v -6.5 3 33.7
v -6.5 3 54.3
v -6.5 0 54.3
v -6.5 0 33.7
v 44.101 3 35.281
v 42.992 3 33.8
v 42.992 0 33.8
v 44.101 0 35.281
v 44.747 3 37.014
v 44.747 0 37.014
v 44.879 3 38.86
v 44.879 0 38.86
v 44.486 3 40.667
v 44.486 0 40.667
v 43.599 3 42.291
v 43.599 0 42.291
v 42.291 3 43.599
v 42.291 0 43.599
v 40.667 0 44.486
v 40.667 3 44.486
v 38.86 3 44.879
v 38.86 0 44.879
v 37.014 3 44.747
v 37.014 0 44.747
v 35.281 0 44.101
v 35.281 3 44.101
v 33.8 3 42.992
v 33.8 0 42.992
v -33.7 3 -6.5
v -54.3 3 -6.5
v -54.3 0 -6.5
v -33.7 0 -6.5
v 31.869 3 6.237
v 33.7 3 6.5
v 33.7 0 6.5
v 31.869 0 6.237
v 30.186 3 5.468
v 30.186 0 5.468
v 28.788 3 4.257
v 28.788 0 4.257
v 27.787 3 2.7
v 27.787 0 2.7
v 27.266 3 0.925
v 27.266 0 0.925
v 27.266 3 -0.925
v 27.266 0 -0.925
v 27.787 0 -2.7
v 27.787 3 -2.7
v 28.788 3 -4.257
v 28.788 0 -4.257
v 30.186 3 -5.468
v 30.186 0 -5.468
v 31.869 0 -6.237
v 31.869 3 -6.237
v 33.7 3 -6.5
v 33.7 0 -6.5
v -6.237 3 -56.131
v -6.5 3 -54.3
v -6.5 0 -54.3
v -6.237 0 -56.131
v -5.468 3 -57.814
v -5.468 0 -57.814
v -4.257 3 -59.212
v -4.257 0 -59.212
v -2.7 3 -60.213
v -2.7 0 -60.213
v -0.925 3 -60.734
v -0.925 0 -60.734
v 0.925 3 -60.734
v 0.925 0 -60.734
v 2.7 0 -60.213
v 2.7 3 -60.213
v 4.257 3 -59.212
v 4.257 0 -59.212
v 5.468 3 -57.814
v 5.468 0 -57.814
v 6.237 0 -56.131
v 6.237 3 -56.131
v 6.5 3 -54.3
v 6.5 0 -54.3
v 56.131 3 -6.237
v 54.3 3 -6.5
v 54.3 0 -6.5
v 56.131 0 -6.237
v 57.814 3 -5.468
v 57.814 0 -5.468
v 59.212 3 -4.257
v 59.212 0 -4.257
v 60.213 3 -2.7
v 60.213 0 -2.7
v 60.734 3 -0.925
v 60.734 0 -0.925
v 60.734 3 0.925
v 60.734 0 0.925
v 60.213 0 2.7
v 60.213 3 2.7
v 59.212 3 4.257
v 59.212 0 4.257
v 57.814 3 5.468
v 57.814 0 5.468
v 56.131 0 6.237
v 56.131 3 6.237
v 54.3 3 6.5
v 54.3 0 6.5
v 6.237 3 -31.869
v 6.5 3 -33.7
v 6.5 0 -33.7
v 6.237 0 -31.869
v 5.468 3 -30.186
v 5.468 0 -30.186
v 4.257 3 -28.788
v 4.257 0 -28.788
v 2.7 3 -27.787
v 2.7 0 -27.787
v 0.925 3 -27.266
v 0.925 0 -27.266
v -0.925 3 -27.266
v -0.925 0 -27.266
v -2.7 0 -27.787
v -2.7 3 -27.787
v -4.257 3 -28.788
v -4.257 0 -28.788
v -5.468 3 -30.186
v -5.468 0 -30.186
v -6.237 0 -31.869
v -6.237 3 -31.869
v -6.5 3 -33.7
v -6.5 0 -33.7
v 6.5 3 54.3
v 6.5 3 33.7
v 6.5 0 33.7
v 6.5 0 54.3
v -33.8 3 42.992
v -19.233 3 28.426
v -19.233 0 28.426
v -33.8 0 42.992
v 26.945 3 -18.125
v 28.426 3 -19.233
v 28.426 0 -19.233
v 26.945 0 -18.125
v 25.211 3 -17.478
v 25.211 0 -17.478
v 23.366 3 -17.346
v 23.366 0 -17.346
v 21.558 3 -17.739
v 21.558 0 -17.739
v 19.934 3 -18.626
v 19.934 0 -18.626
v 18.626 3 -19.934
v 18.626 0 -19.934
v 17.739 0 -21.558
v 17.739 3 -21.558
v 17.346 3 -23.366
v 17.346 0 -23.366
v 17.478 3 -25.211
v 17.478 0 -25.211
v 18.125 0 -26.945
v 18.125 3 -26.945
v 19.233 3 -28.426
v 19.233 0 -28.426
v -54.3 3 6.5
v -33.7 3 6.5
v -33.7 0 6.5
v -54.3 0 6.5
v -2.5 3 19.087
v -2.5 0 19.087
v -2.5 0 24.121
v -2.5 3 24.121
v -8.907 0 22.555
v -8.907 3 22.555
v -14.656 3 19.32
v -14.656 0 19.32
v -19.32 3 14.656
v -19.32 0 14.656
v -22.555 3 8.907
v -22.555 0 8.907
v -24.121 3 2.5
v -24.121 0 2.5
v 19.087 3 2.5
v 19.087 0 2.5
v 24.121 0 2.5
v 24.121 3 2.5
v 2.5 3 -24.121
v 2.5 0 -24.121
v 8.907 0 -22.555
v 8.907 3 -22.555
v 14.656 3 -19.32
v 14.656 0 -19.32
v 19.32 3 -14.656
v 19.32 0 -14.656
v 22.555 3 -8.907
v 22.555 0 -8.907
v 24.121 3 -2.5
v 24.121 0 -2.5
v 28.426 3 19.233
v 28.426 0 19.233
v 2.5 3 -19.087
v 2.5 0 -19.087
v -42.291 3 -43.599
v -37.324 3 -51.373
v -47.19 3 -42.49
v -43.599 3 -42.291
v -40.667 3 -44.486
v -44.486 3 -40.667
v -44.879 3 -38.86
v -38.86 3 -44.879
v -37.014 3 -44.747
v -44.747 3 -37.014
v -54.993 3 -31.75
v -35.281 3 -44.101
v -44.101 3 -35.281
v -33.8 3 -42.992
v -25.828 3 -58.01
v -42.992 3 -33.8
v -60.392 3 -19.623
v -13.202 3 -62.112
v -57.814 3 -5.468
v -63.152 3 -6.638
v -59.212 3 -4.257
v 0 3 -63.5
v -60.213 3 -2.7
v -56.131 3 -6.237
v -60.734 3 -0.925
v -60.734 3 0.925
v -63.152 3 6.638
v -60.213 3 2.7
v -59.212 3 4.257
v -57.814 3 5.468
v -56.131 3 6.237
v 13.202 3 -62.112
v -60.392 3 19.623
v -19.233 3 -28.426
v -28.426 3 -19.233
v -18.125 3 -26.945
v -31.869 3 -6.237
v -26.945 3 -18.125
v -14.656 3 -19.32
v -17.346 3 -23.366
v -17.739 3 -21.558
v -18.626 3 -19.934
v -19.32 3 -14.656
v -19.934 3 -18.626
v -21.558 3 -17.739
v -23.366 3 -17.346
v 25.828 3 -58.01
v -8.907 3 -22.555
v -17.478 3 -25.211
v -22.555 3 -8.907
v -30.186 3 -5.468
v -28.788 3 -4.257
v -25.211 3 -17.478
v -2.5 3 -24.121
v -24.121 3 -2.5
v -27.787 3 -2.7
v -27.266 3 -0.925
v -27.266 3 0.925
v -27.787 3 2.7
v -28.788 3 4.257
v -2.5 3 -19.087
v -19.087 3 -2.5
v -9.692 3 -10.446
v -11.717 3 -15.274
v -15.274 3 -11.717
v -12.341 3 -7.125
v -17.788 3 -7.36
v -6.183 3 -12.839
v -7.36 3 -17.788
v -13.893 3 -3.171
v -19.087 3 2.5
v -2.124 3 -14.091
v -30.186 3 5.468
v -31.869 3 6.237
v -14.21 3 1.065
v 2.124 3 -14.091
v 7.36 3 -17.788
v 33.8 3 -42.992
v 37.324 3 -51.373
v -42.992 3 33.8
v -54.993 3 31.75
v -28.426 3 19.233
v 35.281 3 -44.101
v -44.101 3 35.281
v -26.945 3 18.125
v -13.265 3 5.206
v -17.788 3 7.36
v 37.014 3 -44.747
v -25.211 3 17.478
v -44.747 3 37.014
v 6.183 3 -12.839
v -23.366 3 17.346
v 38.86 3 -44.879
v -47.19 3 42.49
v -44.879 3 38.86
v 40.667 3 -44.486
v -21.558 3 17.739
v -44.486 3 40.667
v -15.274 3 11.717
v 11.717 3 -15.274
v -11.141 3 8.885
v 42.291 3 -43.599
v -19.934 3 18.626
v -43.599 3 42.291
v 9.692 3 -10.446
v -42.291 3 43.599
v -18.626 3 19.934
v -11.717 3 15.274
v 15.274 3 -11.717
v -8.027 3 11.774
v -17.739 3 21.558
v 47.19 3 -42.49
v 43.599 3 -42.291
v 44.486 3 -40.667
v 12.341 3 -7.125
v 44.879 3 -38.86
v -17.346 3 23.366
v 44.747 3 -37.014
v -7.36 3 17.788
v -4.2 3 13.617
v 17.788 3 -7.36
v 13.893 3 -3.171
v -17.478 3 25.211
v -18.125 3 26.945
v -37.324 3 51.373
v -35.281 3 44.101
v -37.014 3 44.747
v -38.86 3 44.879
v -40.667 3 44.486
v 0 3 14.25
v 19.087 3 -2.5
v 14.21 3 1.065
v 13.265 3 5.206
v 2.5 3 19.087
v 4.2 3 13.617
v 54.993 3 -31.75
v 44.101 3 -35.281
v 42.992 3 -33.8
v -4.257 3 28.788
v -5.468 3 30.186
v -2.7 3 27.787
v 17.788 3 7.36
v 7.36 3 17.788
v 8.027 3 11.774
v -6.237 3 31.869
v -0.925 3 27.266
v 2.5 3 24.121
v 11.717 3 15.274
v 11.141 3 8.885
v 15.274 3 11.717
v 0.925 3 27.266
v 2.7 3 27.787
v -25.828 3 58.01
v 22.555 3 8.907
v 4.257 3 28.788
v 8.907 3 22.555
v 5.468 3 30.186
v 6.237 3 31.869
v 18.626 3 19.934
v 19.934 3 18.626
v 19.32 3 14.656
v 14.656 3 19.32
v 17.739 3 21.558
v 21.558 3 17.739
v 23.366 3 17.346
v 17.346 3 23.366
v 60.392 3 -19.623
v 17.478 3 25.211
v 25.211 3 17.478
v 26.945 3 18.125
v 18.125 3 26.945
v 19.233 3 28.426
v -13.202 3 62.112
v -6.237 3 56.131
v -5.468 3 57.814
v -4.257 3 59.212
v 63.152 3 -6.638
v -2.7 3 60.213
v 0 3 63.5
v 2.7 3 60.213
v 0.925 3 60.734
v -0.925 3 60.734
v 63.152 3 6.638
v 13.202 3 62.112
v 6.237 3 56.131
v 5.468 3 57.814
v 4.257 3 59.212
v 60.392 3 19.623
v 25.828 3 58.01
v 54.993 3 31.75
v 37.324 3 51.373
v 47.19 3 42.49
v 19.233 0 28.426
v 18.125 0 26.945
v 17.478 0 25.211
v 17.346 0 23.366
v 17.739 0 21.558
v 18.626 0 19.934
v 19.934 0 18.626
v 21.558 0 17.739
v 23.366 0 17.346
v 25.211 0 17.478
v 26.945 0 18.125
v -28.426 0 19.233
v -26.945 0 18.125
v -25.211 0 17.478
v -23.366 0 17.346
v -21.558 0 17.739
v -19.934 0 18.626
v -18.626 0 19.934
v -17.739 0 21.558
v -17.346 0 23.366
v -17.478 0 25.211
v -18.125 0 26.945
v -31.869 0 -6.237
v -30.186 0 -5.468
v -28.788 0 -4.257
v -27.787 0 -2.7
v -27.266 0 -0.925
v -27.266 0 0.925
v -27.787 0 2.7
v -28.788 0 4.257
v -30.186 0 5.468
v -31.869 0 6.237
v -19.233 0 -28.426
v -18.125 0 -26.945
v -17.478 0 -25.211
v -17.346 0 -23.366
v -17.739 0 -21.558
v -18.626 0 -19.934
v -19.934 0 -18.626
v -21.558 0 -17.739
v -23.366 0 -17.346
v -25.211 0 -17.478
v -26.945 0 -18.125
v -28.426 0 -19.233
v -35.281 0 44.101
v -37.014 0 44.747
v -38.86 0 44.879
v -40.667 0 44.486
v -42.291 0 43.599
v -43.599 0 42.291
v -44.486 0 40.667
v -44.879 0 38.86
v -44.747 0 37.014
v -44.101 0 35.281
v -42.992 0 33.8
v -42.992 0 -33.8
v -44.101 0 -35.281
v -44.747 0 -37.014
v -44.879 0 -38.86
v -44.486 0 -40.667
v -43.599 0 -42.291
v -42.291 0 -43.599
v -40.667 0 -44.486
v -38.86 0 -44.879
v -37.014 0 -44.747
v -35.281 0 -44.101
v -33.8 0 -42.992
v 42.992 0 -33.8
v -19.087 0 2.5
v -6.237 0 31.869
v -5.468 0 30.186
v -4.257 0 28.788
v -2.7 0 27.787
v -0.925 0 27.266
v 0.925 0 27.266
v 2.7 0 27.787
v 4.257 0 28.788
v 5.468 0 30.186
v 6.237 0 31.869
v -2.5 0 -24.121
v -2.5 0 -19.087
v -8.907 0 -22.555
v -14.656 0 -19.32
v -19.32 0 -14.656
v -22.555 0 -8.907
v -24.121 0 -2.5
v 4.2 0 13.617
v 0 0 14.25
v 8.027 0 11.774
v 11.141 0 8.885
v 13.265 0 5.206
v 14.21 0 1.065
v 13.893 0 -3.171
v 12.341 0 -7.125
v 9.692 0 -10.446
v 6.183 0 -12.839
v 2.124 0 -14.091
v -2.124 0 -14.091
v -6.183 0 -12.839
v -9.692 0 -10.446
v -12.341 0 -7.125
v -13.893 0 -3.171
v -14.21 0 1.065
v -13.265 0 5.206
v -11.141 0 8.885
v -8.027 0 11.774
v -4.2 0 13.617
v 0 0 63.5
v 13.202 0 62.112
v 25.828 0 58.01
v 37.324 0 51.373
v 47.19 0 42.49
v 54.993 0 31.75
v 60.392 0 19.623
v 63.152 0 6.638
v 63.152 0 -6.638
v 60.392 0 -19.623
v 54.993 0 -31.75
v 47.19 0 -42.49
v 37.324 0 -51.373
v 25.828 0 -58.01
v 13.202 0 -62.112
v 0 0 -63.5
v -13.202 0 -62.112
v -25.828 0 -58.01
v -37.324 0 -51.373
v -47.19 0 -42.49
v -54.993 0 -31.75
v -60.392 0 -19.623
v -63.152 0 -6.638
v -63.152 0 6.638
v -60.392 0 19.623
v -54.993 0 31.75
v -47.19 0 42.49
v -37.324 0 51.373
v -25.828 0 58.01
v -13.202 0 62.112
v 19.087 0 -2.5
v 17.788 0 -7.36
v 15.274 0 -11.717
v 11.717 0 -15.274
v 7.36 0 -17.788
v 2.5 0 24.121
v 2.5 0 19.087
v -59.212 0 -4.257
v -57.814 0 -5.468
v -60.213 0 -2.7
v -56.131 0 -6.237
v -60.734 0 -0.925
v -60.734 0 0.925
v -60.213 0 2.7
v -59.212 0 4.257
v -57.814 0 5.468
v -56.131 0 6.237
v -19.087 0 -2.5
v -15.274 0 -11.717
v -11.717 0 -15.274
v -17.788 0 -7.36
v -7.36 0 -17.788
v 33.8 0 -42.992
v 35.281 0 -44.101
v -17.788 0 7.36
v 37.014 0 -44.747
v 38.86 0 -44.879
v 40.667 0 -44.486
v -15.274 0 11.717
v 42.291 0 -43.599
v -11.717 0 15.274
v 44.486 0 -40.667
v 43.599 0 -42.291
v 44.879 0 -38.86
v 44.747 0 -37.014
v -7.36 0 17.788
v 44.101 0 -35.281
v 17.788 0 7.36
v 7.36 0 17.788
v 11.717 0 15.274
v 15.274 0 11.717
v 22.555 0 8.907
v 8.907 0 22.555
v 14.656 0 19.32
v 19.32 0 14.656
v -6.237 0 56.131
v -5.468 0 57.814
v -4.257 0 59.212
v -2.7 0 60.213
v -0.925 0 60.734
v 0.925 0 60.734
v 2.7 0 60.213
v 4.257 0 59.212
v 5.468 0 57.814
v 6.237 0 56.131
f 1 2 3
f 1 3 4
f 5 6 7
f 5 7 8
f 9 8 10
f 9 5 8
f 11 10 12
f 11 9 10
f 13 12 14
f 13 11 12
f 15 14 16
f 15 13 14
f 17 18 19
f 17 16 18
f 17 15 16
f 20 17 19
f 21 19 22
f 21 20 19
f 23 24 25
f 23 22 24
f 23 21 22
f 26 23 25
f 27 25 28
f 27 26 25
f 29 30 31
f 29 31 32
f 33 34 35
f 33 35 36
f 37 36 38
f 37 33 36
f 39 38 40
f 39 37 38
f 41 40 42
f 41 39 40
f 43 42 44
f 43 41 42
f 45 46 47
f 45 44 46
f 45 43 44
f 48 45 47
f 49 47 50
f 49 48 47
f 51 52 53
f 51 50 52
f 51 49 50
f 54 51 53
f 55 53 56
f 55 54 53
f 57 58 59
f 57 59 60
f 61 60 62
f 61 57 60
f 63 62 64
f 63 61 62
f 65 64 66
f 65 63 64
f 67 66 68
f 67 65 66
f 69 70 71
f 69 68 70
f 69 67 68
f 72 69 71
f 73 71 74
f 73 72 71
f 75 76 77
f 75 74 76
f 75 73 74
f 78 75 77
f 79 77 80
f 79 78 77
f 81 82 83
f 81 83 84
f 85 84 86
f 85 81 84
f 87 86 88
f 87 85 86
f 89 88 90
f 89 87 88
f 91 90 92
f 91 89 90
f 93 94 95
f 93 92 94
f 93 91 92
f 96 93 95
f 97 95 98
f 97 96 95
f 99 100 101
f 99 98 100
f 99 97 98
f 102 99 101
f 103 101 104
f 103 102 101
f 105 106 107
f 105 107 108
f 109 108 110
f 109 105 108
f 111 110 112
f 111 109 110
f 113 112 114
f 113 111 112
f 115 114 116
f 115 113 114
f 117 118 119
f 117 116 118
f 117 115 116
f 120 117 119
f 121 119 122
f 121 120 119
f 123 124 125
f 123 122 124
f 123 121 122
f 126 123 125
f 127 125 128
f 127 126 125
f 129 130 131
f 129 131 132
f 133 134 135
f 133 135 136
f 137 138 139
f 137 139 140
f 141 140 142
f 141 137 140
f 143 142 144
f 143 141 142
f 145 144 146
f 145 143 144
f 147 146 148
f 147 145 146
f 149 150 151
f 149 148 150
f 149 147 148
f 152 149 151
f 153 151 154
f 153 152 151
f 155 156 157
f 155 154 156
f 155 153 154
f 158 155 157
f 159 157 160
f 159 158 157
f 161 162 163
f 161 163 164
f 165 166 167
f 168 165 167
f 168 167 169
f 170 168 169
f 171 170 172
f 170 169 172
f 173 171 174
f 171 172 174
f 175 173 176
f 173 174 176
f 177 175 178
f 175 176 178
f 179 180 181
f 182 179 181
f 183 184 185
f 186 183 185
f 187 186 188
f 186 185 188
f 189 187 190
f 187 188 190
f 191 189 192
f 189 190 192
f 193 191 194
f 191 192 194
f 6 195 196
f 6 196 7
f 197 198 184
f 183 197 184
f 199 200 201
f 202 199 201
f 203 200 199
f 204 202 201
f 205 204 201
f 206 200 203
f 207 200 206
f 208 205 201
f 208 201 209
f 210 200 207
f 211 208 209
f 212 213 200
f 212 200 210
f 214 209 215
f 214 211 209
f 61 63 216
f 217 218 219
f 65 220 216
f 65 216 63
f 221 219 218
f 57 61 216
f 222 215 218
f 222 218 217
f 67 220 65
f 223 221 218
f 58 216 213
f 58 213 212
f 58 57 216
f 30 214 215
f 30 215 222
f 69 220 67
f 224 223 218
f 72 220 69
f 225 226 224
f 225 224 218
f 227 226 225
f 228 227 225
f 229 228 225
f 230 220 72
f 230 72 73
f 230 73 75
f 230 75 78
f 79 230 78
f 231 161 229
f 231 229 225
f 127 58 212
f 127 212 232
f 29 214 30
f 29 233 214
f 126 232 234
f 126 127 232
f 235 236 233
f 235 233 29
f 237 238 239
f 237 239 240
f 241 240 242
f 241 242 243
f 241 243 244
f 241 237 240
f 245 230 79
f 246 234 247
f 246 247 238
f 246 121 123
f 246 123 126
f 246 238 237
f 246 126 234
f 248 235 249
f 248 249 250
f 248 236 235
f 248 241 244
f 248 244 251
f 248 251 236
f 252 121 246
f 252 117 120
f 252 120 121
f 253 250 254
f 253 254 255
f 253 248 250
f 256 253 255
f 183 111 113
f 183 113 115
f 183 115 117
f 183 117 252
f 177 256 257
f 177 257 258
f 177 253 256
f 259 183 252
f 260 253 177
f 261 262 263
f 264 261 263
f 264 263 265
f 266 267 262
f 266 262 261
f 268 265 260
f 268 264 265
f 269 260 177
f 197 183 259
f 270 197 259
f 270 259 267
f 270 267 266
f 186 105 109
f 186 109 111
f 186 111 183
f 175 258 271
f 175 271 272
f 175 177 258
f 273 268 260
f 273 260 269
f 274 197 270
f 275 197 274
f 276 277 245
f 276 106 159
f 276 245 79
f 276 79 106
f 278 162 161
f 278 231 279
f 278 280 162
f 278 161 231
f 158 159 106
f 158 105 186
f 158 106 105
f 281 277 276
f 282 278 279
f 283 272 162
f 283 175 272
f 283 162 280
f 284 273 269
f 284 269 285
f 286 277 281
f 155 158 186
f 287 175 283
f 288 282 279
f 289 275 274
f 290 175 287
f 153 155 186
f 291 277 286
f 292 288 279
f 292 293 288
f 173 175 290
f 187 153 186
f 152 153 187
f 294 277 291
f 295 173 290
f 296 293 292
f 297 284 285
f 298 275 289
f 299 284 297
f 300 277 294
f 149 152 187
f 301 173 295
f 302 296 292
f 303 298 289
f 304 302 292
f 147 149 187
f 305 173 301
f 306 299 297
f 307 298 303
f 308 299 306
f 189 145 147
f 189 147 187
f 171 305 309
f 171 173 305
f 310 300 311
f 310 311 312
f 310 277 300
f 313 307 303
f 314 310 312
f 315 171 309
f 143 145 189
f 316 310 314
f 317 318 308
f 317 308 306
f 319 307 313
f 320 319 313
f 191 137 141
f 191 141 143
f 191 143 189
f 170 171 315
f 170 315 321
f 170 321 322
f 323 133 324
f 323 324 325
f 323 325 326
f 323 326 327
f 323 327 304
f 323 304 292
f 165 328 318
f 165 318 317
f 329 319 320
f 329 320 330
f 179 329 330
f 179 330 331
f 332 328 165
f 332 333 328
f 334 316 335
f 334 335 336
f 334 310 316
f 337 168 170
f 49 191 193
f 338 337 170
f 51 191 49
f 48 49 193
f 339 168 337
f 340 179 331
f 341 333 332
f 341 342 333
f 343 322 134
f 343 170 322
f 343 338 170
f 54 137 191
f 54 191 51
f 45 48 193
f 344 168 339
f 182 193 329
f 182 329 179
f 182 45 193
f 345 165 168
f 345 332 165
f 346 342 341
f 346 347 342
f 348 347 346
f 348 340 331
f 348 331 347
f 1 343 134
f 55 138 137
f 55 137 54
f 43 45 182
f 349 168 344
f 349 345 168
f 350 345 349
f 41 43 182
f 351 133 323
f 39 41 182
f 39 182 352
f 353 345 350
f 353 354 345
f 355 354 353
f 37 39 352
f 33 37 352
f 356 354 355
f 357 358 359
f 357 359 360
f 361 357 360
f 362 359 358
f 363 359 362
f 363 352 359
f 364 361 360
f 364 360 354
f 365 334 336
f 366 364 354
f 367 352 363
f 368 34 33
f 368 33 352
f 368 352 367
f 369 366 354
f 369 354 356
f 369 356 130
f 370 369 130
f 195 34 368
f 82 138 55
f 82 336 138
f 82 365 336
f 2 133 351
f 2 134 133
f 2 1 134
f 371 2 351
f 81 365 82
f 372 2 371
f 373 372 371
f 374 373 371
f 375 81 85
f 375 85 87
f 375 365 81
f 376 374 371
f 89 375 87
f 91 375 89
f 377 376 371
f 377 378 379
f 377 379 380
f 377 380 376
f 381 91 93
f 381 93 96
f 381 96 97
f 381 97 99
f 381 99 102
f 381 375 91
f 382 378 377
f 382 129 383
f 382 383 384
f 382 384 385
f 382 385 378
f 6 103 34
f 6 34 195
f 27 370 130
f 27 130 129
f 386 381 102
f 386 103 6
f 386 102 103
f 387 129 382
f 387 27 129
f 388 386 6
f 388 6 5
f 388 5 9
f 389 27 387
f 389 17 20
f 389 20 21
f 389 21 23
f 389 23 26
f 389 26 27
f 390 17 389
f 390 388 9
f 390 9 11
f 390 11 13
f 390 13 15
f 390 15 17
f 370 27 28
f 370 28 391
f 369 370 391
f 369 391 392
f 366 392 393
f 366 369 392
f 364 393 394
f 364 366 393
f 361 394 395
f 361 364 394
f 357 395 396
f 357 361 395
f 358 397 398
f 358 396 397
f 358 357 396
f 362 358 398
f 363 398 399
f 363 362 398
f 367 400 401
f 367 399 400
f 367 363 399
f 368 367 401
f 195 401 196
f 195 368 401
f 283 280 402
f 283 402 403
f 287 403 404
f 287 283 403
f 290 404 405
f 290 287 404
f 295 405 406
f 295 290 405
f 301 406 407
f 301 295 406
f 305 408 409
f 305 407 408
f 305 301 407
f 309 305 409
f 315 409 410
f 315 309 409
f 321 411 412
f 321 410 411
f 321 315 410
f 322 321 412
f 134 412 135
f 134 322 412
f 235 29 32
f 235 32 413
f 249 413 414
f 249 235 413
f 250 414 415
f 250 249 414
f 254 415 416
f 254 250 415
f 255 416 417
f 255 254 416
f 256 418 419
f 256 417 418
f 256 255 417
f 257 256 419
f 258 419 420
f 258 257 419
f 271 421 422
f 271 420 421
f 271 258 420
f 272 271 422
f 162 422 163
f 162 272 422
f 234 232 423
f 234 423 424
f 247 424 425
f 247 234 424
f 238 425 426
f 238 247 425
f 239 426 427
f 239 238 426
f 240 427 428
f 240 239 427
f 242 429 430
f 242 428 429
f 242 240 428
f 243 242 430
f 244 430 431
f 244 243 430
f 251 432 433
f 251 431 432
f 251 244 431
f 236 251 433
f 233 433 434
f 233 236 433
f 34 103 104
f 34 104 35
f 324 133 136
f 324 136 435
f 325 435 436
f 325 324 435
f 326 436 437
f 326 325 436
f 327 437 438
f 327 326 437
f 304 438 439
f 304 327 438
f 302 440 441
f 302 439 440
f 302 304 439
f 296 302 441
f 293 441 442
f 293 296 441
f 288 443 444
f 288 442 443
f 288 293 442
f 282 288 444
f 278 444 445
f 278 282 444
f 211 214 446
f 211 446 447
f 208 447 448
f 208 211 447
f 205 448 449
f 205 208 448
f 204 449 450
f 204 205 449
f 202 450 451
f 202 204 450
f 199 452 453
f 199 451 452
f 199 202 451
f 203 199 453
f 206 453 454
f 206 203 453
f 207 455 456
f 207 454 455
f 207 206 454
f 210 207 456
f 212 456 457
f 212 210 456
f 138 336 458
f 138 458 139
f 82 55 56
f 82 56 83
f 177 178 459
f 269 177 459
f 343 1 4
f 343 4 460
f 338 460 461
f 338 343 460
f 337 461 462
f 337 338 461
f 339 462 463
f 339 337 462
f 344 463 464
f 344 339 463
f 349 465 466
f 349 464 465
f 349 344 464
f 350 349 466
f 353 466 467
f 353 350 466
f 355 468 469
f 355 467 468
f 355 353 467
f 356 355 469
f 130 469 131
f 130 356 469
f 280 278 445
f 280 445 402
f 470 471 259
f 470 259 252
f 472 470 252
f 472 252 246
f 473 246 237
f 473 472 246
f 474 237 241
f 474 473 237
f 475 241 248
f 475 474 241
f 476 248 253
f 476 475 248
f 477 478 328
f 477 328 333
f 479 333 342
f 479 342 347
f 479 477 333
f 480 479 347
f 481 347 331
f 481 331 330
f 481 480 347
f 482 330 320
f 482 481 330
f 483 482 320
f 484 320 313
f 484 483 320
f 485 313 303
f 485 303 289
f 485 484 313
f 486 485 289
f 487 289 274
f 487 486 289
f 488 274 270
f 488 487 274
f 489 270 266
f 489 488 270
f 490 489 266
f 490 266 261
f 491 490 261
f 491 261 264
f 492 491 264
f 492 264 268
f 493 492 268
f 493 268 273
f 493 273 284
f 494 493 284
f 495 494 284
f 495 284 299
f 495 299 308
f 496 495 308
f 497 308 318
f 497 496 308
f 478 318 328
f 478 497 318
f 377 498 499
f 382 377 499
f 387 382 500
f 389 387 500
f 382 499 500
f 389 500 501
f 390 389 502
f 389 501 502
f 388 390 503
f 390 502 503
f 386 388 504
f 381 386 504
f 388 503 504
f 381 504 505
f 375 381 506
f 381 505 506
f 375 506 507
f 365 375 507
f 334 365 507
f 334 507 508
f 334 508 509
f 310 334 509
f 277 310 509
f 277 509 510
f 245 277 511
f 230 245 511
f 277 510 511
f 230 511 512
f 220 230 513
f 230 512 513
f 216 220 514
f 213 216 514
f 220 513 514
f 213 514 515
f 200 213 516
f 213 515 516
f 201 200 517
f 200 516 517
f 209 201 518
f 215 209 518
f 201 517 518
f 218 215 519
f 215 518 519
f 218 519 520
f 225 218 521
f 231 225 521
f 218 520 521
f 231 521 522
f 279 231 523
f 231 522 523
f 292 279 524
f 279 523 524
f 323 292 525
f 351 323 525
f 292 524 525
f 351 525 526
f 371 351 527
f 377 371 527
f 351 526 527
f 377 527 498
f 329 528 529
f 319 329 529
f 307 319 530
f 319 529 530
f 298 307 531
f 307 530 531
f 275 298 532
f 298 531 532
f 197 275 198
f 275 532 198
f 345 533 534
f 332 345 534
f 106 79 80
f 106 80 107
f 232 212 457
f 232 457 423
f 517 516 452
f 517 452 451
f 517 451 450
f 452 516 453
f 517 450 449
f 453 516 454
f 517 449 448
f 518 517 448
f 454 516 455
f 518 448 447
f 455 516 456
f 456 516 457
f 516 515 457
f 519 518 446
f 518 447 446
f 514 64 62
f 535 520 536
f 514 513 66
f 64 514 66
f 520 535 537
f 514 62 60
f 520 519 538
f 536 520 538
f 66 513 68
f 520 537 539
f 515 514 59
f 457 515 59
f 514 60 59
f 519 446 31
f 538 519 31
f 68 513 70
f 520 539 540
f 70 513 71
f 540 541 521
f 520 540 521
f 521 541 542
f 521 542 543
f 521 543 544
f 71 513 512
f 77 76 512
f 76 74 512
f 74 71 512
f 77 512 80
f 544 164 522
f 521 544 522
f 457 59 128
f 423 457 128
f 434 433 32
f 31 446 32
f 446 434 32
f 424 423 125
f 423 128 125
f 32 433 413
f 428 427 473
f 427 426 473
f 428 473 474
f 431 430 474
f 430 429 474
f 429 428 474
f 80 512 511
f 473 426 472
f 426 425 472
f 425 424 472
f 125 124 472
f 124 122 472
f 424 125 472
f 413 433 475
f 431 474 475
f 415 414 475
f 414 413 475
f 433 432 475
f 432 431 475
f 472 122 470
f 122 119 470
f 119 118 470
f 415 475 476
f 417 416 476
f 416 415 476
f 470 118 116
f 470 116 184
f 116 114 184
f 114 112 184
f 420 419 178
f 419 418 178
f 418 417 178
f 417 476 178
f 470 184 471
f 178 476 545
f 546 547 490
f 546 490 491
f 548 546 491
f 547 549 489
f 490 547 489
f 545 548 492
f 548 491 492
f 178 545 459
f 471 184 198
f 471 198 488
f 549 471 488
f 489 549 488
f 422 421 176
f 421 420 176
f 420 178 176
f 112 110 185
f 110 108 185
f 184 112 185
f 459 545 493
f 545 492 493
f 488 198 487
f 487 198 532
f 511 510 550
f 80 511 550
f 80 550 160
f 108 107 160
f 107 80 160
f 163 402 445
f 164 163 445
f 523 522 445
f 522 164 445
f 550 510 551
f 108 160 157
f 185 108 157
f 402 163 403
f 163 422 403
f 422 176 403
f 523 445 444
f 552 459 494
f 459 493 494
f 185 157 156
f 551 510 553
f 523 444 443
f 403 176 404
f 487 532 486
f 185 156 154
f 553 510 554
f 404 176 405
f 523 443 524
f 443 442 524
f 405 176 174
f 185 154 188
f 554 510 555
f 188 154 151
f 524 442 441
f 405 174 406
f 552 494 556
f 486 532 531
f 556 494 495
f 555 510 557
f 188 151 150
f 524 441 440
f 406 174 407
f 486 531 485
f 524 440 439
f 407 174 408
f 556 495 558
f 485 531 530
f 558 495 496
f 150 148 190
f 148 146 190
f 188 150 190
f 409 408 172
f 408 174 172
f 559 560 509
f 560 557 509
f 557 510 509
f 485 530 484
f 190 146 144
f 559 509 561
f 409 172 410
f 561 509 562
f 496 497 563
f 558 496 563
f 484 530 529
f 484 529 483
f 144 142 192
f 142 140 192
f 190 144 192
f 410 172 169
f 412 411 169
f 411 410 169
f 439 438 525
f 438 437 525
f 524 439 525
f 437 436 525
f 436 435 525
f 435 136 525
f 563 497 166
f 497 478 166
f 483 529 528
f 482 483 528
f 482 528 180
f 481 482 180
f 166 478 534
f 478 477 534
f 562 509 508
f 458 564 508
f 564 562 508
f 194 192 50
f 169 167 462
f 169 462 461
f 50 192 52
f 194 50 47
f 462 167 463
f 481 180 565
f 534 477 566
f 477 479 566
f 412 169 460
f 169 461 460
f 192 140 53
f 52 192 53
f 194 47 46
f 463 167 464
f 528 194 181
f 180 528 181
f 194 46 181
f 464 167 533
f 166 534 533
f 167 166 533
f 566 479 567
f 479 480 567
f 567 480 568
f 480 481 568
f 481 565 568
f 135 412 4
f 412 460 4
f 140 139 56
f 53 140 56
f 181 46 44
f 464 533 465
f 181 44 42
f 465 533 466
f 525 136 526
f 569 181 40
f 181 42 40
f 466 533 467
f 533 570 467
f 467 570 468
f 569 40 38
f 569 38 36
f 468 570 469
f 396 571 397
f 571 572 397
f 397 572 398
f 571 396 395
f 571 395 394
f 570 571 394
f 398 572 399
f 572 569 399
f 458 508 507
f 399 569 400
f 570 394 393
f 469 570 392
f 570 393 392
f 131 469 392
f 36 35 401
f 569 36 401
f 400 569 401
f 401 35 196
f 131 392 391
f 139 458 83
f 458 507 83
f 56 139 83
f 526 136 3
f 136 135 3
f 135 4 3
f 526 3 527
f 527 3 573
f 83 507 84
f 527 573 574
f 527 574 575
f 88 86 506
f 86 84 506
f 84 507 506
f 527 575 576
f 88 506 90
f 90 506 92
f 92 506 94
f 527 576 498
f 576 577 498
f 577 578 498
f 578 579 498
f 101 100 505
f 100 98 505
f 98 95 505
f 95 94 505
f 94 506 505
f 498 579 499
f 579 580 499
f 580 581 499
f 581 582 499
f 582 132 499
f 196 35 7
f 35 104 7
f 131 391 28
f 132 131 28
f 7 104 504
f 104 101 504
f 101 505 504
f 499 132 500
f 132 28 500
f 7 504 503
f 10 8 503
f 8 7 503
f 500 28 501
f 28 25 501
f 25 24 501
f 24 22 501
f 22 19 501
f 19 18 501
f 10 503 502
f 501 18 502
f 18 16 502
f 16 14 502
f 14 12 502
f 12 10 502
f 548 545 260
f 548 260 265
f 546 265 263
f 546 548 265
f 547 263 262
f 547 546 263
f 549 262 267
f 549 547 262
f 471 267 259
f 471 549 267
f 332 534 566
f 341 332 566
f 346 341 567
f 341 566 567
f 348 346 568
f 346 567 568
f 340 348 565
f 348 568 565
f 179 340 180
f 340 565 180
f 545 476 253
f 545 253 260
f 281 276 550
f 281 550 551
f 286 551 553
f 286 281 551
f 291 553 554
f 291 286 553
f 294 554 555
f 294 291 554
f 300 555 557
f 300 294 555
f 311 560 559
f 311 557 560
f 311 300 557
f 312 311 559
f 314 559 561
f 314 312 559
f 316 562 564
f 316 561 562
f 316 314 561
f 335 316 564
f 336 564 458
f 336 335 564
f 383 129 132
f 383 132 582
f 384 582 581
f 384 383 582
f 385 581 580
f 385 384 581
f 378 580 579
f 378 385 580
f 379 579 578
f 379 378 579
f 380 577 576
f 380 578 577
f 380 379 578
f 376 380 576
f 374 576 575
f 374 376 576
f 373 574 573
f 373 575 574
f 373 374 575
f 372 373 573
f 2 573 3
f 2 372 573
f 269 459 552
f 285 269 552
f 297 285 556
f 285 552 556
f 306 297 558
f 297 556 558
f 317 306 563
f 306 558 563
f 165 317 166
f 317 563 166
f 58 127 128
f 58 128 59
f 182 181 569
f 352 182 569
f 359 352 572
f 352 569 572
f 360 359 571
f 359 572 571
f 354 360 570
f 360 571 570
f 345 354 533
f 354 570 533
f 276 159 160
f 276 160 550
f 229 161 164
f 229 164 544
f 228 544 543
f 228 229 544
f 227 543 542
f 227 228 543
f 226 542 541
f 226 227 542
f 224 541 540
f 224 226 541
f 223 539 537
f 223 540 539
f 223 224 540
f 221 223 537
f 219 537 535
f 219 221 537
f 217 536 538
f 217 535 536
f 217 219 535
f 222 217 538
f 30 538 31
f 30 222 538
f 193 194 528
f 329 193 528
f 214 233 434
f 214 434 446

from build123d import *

# Parameters (mm, degrees)
SKETCH1_R           = 63.5
SKETCH1_R_2         = 14.25
BOSS_EXTRUDE1_DEPTH = 3
CUT_EXTRUDE1_DEPTH  = 90.852657167
CIRPATTERN1_COUNT   = 8


with BuildPart() as part:
    # Sketch1 → Boss-Extrude1 (new body)
    with BuildSketch(Plane(origin=(0, 0, 0), x_dir=(1, 0, 0), z_dir=(0, 1, 0))):
        with Locations(Location((0, 0, 0), (0, 0, 270))):
            Circle(SKETCH1_R)
        with Locations(Location((0, 0, 0), (0, 0, 270))):
            Circle(SKETCH1_R_2, mode=Mode.SUBTRACT)
        with BuildLine():
            Line((-2.5, 19.086971997), (-2.5, 24.120789788))
            ThreePointArc((-2.5, 24.120789788), (-17.147339444, 17.147339444), (-24.120789788, 2.5))
            Line((-24.120789788, 2.5), (-19.086971997, 2.5))
            ThreePointArc((-19.086971997, 2.5), (-13.611805538, 13.611805538), (-2.5, 19.086971997))
        make_face(mode=Mode.SUBTRACT)
        with BuildLine():
            Line((2.5, 19.086971997), (2.5, 24.120789788))
            ThreePointArc((2.5, 24.120789788), (17.147339444, 17.147339444), (24.120789788, 2.5))
            Line((24.120789788, 2.5), (19.086971997, 2.5))
            ThreePointArc((19.086971997, 2.5), (13.611805538, 13.611805538), (2.5, 19.086971997))
        make_face(mode=Mode.SUBTRACT)
        with BuildLine():
            Line((19.086971997, -2.5), (24.120789788, -2.5))
            ThreePointArc((24.120789788, -2.5), (17.147339444, -17.147339444), (2.5, -24.120789788))
            Line((2.5, -24.120789788), (2.5, -19.086971997))
            ThreePointArc((2.5, -19.086971997), (13.611805538, -13.611805538), (19.086971997, -2.5))
        make_face(mode=Mode.SUBTRACT)
        with BuildLine():
            Line((-2.5, -19.086971997), (-2.5, -24.120789788))
            ThreePointArc((-2.5, -24.120789788), (-17.147339444, -17.147339444), (-24.120789788, -2.5))
            Line((-24.120789788, -2.5), (-19.086971997, -2.5))
            ThreePointArc((-19.086971997, -2.5), (-13.611805538, -13.611805538), (-2.5, -19.086971997))
        make_face(mode=Mode.SUBTRACT)
    extrude(amount=BOSS_EXTRUDE1_DEPTH)

    # Sketch4 → Cut-Extrude1 (cut, through all)
    with BuildSketch(Plane(origin=(0, 3, 0), x_dir=(1, 0, 0), z_dir=(0, 1, 0))):
        with BuildLine():
            Line((-6.5, 33.7), (-6.5, 54.3))
            ThreePointArc((-6.5, 54.3), (0, 60.8), (6.5, 54.3))
            Line((6.5, 54.3), (6.5, 33.7))
            ThreePointArc((6.5, 33.7), (0, 27.2), (-6.5, 33.7))
        make_face()
    cut_extrude1 = extrude(amount=-CUT_EXTRUDE1_DEPTH, mode=Mode.SUBTRACT)

    # CirPattern1: Cut-Extrude1 ×8 about axis
    cirpattern1_axis = Axis((0, 0, 0), (0, 1, 0))
    for i in range(1, CIRPATTERN1_COUNT):
        add(cut_extrude1.rotate(cirpattern1_axis, i * 360 / CIRPATTERN1_COUNT), mode=Mode.SUBTRACT)


solid = part.part
